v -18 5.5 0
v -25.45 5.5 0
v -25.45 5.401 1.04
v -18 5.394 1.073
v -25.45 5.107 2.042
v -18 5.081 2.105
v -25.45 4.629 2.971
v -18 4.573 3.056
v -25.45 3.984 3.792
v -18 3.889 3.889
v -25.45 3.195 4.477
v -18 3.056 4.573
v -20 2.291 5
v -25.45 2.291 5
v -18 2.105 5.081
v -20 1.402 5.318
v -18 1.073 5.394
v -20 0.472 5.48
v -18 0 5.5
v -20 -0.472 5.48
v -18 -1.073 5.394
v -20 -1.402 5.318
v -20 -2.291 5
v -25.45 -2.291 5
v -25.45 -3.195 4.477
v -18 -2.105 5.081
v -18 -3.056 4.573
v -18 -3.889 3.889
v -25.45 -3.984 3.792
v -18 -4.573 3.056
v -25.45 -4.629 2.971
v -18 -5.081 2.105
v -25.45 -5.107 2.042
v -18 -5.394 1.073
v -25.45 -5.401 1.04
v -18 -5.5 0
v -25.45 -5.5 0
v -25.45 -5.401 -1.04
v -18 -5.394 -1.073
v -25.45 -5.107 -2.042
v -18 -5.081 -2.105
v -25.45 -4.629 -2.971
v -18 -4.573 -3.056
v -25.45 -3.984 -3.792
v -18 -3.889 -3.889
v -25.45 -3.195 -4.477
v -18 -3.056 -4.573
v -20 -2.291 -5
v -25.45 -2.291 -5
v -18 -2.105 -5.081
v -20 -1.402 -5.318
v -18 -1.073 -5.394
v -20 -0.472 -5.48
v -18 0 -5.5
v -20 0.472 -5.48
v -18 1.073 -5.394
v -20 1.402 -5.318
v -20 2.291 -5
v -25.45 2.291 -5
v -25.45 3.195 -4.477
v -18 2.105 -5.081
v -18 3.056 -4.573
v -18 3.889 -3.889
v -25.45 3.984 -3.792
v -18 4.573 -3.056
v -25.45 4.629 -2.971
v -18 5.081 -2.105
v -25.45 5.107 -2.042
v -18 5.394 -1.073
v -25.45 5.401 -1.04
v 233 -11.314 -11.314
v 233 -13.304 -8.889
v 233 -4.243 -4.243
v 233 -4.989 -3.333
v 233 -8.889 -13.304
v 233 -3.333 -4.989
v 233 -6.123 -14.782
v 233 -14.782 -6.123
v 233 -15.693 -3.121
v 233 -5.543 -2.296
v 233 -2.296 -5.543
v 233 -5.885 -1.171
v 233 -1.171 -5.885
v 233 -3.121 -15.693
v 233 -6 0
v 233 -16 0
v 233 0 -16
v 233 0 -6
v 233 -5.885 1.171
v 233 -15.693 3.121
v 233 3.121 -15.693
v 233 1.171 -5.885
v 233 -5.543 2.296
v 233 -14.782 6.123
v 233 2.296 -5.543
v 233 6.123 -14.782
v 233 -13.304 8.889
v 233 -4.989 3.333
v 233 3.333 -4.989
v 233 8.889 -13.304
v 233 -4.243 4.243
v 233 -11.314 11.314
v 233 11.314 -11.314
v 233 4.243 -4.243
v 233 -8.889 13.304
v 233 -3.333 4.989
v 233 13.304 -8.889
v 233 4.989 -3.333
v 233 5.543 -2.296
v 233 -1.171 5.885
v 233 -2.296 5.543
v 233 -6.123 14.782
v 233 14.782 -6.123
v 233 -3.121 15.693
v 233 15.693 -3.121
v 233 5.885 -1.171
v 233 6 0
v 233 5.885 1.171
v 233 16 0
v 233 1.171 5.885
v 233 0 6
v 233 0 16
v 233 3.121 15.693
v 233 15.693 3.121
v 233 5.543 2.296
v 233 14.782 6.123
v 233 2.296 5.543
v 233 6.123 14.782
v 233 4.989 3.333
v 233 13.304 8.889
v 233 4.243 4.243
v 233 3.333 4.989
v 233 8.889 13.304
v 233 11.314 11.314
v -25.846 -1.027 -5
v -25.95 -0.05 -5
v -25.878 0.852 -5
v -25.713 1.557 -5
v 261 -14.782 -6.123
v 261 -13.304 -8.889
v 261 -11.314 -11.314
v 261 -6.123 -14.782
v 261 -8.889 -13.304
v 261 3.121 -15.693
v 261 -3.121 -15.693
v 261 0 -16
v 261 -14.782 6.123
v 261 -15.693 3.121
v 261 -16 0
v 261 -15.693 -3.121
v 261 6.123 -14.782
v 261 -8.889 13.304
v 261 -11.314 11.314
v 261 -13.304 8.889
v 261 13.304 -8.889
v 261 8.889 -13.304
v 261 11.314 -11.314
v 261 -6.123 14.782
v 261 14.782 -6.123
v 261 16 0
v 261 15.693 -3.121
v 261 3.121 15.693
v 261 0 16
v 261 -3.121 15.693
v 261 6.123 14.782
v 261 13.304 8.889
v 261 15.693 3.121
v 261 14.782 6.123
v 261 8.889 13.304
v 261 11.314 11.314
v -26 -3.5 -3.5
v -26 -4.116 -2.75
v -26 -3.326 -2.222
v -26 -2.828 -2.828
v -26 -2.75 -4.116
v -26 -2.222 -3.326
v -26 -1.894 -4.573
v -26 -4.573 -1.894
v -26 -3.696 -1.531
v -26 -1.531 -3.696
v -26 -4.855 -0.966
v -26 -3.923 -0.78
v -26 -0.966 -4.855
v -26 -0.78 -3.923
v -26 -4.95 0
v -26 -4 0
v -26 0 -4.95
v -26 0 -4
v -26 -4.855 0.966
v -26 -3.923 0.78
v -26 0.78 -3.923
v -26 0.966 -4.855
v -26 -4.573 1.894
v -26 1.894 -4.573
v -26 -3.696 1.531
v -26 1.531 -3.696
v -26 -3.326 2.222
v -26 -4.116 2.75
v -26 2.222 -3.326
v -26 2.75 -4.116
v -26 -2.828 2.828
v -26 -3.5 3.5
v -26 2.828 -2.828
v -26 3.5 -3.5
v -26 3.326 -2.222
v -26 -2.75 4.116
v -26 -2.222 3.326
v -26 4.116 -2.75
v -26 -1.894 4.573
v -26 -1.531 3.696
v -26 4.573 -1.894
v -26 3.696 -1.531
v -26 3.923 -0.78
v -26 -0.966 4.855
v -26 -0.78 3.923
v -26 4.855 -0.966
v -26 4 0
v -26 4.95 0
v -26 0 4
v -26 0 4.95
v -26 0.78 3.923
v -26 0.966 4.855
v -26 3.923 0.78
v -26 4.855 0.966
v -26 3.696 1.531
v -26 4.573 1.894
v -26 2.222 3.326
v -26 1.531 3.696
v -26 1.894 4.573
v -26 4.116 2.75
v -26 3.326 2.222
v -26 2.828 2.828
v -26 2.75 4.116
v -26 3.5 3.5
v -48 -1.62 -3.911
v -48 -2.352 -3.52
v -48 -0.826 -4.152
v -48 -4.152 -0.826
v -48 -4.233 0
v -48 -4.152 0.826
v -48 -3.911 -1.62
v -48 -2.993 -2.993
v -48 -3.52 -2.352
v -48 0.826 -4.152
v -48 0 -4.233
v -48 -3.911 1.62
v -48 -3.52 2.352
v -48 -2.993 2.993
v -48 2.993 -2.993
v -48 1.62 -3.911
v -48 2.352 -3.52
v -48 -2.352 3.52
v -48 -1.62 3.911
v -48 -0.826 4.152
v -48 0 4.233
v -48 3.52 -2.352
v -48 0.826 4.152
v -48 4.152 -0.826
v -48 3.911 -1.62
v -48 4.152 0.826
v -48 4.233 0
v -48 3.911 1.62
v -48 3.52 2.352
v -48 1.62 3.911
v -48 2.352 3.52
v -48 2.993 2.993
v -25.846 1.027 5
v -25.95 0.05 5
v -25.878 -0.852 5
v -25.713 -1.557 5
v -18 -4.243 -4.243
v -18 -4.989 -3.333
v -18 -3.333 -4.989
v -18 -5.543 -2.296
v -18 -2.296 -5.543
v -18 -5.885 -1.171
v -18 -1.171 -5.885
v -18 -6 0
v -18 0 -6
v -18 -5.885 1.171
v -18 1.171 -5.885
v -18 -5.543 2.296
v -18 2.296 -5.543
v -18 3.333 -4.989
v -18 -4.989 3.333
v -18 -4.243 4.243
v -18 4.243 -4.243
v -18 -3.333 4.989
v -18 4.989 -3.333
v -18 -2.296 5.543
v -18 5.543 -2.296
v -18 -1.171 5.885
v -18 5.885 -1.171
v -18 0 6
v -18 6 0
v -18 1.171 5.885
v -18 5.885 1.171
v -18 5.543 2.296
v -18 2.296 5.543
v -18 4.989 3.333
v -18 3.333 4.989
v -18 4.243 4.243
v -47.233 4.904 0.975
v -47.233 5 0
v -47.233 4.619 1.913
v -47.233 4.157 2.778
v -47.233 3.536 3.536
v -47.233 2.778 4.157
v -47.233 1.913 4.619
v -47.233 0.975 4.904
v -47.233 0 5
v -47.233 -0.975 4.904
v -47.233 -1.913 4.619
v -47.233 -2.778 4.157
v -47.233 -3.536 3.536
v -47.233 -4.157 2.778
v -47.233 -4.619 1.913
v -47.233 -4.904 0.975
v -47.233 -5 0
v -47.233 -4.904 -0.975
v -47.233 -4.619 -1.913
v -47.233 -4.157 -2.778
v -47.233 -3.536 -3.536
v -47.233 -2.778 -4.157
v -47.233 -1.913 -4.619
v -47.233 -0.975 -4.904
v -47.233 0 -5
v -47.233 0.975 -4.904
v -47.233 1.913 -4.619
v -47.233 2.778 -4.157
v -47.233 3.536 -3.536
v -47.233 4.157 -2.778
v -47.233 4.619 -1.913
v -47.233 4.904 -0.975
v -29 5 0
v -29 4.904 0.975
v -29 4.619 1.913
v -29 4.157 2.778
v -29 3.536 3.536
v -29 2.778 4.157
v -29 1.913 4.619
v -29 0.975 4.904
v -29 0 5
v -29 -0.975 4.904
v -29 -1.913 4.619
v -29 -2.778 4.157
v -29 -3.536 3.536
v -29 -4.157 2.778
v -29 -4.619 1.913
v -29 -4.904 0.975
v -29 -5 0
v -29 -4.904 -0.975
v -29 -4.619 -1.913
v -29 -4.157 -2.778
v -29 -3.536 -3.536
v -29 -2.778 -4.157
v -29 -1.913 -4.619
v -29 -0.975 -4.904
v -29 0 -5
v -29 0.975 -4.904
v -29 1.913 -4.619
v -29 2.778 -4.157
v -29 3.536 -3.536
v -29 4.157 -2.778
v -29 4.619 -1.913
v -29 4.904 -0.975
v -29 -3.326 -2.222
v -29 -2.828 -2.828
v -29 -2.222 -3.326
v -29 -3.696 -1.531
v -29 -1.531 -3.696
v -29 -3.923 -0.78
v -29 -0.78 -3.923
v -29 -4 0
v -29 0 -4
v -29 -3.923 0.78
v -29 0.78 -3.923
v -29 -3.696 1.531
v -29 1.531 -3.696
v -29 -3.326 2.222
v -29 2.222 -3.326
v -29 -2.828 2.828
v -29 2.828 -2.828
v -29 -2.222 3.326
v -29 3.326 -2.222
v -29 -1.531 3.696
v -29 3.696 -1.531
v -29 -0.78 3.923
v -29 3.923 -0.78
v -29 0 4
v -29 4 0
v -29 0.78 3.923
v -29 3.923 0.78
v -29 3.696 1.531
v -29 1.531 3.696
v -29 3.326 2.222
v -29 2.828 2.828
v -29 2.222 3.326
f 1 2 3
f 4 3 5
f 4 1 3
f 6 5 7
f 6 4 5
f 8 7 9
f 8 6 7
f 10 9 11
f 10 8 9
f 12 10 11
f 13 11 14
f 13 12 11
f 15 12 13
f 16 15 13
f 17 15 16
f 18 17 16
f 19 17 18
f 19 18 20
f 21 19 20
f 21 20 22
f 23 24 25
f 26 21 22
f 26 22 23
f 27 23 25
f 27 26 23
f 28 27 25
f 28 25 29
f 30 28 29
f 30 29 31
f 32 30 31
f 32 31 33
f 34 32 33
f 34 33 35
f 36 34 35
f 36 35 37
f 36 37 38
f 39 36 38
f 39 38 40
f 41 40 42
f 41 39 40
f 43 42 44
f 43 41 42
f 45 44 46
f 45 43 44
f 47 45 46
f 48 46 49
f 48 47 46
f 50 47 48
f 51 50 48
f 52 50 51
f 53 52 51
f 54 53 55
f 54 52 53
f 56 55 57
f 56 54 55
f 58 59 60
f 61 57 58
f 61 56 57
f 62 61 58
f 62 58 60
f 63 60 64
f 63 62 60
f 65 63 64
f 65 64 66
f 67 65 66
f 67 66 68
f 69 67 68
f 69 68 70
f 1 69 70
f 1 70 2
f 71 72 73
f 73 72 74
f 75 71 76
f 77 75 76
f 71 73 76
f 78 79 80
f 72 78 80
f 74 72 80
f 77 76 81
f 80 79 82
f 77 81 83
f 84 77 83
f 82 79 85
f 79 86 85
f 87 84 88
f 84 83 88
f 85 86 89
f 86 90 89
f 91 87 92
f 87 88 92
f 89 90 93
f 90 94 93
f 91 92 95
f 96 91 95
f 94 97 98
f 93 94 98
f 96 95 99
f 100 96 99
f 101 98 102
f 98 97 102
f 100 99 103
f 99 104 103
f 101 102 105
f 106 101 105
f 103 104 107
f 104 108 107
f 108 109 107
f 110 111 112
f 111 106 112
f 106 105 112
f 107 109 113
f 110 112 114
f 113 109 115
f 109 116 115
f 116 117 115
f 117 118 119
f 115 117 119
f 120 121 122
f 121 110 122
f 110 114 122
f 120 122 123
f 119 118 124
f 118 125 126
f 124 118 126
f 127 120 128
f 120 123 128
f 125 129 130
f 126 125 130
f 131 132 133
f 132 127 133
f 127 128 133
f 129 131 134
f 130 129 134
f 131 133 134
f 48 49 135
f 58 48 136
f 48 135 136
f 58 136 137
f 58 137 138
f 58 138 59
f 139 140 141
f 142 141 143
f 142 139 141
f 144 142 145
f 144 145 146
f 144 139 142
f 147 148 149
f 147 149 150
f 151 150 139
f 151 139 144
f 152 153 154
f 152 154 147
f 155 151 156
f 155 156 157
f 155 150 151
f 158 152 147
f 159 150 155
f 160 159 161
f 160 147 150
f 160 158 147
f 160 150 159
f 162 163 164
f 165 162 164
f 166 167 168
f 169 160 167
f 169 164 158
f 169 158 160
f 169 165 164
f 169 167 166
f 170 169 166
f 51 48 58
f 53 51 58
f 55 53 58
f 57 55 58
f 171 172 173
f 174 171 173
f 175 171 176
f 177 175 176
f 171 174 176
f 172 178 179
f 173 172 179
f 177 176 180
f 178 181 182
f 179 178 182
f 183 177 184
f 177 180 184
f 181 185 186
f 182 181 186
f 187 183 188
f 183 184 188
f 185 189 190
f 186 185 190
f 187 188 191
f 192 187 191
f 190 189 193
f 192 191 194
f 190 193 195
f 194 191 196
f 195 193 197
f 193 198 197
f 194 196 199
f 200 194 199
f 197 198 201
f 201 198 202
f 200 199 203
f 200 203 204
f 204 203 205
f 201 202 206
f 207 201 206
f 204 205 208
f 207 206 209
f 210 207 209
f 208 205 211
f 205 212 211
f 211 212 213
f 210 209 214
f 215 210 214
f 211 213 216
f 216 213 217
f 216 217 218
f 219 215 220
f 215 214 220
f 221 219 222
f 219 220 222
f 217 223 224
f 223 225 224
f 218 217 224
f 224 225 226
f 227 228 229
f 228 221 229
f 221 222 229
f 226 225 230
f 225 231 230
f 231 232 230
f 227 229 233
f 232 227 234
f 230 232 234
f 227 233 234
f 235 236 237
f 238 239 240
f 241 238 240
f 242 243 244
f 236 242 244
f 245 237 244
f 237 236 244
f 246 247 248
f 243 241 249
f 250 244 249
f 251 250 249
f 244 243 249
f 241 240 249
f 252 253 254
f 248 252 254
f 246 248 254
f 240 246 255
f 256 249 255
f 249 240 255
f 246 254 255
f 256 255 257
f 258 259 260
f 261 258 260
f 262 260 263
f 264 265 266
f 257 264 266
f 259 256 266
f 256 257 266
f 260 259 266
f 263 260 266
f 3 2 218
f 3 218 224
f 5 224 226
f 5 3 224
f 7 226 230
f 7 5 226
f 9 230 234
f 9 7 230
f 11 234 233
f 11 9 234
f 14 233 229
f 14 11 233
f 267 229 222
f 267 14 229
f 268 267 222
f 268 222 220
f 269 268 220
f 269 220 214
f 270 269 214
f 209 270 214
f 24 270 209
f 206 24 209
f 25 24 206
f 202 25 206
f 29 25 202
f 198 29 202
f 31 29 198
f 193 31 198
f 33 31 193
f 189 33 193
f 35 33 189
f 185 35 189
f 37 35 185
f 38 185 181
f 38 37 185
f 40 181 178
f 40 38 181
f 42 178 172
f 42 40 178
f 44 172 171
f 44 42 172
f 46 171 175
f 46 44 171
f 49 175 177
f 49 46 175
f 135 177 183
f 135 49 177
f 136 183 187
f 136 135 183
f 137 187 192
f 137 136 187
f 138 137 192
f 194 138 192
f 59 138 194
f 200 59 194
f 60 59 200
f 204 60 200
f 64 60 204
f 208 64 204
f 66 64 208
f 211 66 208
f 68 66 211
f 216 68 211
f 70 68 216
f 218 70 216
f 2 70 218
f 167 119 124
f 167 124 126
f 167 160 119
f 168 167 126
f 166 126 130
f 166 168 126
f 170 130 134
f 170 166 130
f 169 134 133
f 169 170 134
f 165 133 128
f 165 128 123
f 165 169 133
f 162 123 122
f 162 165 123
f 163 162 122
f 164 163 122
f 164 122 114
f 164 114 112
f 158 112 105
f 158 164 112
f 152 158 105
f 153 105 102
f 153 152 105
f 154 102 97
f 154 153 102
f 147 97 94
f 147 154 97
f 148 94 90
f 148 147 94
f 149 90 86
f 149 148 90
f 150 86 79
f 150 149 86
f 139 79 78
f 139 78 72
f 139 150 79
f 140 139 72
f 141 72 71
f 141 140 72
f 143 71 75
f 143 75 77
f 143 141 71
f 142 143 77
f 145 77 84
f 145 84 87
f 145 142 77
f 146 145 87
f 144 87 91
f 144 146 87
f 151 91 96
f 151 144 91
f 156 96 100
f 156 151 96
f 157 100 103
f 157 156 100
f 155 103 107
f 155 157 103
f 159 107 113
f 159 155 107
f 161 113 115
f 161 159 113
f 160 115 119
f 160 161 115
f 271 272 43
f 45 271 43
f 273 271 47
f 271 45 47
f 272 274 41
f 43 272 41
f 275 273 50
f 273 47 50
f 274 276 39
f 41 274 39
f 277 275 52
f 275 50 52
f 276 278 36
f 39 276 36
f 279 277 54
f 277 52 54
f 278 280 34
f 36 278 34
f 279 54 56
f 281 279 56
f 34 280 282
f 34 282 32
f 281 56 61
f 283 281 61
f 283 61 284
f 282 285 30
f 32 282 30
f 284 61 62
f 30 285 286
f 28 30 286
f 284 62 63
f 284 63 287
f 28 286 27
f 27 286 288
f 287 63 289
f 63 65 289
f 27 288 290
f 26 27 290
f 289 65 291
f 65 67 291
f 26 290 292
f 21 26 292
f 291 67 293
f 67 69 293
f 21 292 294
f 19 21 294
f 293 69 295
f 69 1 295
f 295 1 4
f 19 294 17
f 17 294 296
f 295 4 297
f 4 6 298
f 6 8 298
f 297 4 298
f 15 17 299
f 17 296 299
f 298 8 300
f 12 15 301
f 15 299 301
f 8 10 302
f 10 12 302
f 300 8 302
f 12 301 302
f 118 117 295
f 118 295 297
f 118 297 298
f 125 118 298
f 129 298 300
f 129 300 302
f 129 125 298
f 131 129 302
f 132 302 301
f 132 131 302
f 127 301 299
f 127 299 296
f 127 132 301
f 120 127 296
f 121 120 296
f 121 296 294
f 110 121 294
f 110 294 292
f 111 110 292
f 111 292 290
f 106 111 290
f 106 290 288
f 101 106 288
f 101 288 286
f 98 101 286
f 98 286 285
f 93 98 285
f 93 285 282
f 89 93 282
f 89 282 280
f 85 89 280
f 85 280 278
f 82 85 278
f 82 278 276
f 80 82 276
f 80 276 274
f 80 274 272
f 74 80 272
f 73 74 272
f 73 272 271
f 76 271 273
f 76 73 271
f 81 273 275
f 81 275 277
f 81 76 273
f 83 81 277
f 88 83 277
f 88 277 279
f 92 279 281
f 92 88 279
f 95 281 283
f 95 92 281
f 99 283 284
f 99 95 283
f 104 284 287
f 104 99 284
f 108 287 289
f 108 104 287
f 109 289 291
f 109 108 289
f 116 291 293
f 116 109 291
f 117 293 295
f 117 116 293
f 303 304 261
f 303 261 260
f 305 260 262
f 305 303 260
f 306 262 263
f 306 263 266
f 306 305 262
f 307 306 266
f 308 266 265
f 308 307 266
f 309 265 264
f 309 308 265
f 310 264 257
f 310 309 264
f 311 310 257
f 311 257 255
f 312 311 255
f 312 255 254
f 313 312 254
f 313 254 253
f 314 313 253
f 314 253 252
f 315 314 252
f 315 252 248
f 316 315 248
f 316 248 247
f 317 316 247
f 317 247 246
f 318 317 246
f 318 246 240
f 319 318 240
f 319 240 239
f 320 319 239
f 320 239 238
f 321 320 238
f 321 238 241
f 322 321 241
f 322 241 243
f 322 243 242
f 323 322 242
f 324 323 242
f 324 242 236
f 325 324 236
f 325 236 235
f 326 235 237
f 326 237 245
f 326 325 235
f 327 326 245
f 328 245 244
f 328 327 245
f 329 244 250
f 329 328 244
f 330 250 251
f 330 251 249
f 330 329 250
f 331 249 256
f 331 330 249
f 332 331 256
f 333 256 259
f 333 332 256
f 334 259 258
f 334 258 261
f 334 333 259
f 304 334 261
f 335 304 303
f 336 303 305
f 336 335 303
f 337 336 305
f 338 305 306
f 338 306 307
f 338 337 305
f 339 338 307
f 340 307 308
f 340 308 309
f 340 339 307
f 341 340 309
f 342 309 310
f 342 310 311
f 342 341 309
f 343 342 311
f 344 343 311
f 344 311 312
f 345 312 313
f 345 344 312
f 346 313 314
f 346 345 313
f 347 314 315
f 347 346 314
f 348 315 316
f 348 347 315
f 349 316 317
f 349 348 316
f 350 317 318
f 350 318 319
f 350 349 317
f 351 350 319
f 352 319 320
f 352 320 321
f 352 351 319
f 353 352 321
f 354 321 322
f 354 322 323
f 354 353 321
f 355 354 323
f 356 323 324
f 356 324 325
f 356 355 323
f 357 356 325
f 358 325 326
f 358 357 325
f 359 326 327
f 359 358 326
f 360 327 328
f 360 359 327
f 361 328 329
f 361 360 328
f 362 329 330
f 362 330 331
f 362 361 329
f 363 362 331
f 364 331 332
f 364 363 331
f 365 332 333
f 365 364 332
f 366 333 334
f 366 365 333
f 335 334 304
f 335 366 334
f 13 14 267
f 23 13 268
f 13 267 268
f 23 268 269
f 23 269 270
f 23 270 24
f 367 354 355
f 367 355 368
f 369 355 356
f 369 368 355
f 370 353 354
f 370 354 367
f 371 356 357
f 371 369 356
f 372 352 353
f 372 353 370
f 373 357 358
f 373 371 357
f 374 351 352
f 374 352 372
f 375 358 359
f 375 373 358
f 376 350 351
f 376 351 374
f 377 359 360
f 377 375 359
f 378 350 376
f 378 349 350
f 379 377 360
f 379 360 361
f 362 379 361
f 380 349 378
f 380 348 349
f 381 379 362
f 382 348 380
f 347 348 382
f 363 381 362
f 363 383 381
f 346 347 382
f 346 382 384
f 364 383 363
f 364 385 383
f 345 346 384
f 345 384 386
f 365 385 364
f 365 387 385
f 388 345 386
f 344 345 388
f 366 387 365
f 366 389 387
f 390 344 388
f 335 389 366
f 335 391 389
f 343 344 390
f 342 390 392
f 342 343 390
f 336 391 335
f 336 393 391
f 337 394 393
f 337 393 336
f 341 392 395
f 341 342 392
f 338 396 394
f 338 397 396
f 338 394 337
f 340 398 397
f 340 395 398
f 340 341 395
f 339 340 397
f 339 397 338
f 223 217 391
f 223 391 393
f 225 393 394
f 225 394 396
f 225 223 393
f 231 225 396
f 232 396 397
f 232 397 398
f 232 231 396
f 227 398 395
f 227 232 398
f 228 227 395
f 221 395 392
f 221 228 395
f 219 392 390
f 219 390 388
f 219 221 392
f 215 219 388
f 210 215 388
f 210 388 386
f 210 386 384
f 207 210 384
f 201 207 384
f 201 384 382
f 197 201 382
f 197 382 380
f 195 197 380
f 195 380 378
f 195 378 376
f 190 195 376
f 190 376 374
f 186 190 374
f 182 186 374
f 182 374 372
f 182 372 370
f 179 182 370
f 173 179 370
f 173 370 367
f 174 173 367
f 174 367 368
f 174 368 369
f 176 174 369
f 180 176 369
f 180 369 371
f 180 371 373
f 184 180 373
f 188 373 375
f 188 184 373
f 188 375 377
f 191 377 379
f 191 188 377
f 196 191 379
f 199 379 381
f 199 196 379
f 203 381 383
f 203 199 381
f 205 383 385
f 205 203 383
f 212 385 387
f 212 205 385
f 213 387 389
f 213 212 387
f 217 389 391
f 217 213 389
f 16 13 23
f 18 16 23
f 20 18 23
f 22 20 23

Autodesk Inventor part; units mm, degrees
sketch "Sketch_1" plane through (0, 0, 0) normal (0, 0, 1) x (1, 0, 0)
  line L0 (261, 0) -> (-48, 0)
  line L1 (-48, 0) -> (-48, 4.233)
  line L2 (-48, 4.233) -> (-47.233, 5)
  line L3 (-47.233, 5) -> (-29, 5)
  line L4 (-29, 5) -> (-29, 4)
  line L5 (-29, 4) -> (-26, 4)
  line L6 (-26, 4) -> (-26, 4.95)
  line L7 (-26, 4.95) -> (-25.45, 5.5)
  line L8 (-25.45, 5.5) -> (-18, 5.5)
  line L9 (-18, 5.5) -> (-18, 6)
  line L10 (-18, 6) -> (233, 6)
  line L11 (233, 6) -> (233, 16)
  line L12 (233, 16) -> (261, 16)
  line L13 (261, 16) -> (261, 0)
  line L14 (261, 0) -> (-48, 0)
revolve "Revolution1" add sketch "Sketch_1" angle 360 about axis through (261, 0, 0) along (1, 0, 0)
thread "Thread1" size "M10x1.25" class "6g" standard "ISO Metric profile" full length
sketch "Sketch_3" plane through (-26, 0, 0) normal (1, 0, 0) x (0, 0, -1)
  line L0 (-10, -20) -> (10, -20)
  line L1 (10, -20) -> (10, 20)
  line L2 (10, 20) -> (-10, 20)
  line L3 (-10, 20) -> (-10, -20)
  line L4 (-5, -10) -> (5, -10)
  line L5 (5, -10) -> (5, 10)
  line L6 (5, 10) -> (-5, 10)
  line L7 (-5, 10) -> (-5, -10)
extrude "Extrusion1" cut sketch "Sketch_3" along normal blind 6
ref_plane "accessories_l_XY" through (-38.5, 0, 0) normal (-1, 0, 0) x (0, 0, -1)
ref_plane "accessories_l_YZ" through (-38.5, 0, 0) normal (0, 0, -1) x (0, -1, 0)
ref_plane "accessories_l_ZX" through (-38.5, 0, 0) normal (0, -1, 0) x (-1, 0, 0)
ref_plane "rod_XY" through (0, 0, 0) normal (1, 0, 0) x (0, 0, -1)
ref_plane "rod_YZ" through (0, 0, 0) normal (0, 0, -1) x (0, 1, 0)
ref_plane "rod_ZX" through (0, 0, 0) normal (0, 1, 0) x (1, 0, 0)
properties part number "32121200-s3"
